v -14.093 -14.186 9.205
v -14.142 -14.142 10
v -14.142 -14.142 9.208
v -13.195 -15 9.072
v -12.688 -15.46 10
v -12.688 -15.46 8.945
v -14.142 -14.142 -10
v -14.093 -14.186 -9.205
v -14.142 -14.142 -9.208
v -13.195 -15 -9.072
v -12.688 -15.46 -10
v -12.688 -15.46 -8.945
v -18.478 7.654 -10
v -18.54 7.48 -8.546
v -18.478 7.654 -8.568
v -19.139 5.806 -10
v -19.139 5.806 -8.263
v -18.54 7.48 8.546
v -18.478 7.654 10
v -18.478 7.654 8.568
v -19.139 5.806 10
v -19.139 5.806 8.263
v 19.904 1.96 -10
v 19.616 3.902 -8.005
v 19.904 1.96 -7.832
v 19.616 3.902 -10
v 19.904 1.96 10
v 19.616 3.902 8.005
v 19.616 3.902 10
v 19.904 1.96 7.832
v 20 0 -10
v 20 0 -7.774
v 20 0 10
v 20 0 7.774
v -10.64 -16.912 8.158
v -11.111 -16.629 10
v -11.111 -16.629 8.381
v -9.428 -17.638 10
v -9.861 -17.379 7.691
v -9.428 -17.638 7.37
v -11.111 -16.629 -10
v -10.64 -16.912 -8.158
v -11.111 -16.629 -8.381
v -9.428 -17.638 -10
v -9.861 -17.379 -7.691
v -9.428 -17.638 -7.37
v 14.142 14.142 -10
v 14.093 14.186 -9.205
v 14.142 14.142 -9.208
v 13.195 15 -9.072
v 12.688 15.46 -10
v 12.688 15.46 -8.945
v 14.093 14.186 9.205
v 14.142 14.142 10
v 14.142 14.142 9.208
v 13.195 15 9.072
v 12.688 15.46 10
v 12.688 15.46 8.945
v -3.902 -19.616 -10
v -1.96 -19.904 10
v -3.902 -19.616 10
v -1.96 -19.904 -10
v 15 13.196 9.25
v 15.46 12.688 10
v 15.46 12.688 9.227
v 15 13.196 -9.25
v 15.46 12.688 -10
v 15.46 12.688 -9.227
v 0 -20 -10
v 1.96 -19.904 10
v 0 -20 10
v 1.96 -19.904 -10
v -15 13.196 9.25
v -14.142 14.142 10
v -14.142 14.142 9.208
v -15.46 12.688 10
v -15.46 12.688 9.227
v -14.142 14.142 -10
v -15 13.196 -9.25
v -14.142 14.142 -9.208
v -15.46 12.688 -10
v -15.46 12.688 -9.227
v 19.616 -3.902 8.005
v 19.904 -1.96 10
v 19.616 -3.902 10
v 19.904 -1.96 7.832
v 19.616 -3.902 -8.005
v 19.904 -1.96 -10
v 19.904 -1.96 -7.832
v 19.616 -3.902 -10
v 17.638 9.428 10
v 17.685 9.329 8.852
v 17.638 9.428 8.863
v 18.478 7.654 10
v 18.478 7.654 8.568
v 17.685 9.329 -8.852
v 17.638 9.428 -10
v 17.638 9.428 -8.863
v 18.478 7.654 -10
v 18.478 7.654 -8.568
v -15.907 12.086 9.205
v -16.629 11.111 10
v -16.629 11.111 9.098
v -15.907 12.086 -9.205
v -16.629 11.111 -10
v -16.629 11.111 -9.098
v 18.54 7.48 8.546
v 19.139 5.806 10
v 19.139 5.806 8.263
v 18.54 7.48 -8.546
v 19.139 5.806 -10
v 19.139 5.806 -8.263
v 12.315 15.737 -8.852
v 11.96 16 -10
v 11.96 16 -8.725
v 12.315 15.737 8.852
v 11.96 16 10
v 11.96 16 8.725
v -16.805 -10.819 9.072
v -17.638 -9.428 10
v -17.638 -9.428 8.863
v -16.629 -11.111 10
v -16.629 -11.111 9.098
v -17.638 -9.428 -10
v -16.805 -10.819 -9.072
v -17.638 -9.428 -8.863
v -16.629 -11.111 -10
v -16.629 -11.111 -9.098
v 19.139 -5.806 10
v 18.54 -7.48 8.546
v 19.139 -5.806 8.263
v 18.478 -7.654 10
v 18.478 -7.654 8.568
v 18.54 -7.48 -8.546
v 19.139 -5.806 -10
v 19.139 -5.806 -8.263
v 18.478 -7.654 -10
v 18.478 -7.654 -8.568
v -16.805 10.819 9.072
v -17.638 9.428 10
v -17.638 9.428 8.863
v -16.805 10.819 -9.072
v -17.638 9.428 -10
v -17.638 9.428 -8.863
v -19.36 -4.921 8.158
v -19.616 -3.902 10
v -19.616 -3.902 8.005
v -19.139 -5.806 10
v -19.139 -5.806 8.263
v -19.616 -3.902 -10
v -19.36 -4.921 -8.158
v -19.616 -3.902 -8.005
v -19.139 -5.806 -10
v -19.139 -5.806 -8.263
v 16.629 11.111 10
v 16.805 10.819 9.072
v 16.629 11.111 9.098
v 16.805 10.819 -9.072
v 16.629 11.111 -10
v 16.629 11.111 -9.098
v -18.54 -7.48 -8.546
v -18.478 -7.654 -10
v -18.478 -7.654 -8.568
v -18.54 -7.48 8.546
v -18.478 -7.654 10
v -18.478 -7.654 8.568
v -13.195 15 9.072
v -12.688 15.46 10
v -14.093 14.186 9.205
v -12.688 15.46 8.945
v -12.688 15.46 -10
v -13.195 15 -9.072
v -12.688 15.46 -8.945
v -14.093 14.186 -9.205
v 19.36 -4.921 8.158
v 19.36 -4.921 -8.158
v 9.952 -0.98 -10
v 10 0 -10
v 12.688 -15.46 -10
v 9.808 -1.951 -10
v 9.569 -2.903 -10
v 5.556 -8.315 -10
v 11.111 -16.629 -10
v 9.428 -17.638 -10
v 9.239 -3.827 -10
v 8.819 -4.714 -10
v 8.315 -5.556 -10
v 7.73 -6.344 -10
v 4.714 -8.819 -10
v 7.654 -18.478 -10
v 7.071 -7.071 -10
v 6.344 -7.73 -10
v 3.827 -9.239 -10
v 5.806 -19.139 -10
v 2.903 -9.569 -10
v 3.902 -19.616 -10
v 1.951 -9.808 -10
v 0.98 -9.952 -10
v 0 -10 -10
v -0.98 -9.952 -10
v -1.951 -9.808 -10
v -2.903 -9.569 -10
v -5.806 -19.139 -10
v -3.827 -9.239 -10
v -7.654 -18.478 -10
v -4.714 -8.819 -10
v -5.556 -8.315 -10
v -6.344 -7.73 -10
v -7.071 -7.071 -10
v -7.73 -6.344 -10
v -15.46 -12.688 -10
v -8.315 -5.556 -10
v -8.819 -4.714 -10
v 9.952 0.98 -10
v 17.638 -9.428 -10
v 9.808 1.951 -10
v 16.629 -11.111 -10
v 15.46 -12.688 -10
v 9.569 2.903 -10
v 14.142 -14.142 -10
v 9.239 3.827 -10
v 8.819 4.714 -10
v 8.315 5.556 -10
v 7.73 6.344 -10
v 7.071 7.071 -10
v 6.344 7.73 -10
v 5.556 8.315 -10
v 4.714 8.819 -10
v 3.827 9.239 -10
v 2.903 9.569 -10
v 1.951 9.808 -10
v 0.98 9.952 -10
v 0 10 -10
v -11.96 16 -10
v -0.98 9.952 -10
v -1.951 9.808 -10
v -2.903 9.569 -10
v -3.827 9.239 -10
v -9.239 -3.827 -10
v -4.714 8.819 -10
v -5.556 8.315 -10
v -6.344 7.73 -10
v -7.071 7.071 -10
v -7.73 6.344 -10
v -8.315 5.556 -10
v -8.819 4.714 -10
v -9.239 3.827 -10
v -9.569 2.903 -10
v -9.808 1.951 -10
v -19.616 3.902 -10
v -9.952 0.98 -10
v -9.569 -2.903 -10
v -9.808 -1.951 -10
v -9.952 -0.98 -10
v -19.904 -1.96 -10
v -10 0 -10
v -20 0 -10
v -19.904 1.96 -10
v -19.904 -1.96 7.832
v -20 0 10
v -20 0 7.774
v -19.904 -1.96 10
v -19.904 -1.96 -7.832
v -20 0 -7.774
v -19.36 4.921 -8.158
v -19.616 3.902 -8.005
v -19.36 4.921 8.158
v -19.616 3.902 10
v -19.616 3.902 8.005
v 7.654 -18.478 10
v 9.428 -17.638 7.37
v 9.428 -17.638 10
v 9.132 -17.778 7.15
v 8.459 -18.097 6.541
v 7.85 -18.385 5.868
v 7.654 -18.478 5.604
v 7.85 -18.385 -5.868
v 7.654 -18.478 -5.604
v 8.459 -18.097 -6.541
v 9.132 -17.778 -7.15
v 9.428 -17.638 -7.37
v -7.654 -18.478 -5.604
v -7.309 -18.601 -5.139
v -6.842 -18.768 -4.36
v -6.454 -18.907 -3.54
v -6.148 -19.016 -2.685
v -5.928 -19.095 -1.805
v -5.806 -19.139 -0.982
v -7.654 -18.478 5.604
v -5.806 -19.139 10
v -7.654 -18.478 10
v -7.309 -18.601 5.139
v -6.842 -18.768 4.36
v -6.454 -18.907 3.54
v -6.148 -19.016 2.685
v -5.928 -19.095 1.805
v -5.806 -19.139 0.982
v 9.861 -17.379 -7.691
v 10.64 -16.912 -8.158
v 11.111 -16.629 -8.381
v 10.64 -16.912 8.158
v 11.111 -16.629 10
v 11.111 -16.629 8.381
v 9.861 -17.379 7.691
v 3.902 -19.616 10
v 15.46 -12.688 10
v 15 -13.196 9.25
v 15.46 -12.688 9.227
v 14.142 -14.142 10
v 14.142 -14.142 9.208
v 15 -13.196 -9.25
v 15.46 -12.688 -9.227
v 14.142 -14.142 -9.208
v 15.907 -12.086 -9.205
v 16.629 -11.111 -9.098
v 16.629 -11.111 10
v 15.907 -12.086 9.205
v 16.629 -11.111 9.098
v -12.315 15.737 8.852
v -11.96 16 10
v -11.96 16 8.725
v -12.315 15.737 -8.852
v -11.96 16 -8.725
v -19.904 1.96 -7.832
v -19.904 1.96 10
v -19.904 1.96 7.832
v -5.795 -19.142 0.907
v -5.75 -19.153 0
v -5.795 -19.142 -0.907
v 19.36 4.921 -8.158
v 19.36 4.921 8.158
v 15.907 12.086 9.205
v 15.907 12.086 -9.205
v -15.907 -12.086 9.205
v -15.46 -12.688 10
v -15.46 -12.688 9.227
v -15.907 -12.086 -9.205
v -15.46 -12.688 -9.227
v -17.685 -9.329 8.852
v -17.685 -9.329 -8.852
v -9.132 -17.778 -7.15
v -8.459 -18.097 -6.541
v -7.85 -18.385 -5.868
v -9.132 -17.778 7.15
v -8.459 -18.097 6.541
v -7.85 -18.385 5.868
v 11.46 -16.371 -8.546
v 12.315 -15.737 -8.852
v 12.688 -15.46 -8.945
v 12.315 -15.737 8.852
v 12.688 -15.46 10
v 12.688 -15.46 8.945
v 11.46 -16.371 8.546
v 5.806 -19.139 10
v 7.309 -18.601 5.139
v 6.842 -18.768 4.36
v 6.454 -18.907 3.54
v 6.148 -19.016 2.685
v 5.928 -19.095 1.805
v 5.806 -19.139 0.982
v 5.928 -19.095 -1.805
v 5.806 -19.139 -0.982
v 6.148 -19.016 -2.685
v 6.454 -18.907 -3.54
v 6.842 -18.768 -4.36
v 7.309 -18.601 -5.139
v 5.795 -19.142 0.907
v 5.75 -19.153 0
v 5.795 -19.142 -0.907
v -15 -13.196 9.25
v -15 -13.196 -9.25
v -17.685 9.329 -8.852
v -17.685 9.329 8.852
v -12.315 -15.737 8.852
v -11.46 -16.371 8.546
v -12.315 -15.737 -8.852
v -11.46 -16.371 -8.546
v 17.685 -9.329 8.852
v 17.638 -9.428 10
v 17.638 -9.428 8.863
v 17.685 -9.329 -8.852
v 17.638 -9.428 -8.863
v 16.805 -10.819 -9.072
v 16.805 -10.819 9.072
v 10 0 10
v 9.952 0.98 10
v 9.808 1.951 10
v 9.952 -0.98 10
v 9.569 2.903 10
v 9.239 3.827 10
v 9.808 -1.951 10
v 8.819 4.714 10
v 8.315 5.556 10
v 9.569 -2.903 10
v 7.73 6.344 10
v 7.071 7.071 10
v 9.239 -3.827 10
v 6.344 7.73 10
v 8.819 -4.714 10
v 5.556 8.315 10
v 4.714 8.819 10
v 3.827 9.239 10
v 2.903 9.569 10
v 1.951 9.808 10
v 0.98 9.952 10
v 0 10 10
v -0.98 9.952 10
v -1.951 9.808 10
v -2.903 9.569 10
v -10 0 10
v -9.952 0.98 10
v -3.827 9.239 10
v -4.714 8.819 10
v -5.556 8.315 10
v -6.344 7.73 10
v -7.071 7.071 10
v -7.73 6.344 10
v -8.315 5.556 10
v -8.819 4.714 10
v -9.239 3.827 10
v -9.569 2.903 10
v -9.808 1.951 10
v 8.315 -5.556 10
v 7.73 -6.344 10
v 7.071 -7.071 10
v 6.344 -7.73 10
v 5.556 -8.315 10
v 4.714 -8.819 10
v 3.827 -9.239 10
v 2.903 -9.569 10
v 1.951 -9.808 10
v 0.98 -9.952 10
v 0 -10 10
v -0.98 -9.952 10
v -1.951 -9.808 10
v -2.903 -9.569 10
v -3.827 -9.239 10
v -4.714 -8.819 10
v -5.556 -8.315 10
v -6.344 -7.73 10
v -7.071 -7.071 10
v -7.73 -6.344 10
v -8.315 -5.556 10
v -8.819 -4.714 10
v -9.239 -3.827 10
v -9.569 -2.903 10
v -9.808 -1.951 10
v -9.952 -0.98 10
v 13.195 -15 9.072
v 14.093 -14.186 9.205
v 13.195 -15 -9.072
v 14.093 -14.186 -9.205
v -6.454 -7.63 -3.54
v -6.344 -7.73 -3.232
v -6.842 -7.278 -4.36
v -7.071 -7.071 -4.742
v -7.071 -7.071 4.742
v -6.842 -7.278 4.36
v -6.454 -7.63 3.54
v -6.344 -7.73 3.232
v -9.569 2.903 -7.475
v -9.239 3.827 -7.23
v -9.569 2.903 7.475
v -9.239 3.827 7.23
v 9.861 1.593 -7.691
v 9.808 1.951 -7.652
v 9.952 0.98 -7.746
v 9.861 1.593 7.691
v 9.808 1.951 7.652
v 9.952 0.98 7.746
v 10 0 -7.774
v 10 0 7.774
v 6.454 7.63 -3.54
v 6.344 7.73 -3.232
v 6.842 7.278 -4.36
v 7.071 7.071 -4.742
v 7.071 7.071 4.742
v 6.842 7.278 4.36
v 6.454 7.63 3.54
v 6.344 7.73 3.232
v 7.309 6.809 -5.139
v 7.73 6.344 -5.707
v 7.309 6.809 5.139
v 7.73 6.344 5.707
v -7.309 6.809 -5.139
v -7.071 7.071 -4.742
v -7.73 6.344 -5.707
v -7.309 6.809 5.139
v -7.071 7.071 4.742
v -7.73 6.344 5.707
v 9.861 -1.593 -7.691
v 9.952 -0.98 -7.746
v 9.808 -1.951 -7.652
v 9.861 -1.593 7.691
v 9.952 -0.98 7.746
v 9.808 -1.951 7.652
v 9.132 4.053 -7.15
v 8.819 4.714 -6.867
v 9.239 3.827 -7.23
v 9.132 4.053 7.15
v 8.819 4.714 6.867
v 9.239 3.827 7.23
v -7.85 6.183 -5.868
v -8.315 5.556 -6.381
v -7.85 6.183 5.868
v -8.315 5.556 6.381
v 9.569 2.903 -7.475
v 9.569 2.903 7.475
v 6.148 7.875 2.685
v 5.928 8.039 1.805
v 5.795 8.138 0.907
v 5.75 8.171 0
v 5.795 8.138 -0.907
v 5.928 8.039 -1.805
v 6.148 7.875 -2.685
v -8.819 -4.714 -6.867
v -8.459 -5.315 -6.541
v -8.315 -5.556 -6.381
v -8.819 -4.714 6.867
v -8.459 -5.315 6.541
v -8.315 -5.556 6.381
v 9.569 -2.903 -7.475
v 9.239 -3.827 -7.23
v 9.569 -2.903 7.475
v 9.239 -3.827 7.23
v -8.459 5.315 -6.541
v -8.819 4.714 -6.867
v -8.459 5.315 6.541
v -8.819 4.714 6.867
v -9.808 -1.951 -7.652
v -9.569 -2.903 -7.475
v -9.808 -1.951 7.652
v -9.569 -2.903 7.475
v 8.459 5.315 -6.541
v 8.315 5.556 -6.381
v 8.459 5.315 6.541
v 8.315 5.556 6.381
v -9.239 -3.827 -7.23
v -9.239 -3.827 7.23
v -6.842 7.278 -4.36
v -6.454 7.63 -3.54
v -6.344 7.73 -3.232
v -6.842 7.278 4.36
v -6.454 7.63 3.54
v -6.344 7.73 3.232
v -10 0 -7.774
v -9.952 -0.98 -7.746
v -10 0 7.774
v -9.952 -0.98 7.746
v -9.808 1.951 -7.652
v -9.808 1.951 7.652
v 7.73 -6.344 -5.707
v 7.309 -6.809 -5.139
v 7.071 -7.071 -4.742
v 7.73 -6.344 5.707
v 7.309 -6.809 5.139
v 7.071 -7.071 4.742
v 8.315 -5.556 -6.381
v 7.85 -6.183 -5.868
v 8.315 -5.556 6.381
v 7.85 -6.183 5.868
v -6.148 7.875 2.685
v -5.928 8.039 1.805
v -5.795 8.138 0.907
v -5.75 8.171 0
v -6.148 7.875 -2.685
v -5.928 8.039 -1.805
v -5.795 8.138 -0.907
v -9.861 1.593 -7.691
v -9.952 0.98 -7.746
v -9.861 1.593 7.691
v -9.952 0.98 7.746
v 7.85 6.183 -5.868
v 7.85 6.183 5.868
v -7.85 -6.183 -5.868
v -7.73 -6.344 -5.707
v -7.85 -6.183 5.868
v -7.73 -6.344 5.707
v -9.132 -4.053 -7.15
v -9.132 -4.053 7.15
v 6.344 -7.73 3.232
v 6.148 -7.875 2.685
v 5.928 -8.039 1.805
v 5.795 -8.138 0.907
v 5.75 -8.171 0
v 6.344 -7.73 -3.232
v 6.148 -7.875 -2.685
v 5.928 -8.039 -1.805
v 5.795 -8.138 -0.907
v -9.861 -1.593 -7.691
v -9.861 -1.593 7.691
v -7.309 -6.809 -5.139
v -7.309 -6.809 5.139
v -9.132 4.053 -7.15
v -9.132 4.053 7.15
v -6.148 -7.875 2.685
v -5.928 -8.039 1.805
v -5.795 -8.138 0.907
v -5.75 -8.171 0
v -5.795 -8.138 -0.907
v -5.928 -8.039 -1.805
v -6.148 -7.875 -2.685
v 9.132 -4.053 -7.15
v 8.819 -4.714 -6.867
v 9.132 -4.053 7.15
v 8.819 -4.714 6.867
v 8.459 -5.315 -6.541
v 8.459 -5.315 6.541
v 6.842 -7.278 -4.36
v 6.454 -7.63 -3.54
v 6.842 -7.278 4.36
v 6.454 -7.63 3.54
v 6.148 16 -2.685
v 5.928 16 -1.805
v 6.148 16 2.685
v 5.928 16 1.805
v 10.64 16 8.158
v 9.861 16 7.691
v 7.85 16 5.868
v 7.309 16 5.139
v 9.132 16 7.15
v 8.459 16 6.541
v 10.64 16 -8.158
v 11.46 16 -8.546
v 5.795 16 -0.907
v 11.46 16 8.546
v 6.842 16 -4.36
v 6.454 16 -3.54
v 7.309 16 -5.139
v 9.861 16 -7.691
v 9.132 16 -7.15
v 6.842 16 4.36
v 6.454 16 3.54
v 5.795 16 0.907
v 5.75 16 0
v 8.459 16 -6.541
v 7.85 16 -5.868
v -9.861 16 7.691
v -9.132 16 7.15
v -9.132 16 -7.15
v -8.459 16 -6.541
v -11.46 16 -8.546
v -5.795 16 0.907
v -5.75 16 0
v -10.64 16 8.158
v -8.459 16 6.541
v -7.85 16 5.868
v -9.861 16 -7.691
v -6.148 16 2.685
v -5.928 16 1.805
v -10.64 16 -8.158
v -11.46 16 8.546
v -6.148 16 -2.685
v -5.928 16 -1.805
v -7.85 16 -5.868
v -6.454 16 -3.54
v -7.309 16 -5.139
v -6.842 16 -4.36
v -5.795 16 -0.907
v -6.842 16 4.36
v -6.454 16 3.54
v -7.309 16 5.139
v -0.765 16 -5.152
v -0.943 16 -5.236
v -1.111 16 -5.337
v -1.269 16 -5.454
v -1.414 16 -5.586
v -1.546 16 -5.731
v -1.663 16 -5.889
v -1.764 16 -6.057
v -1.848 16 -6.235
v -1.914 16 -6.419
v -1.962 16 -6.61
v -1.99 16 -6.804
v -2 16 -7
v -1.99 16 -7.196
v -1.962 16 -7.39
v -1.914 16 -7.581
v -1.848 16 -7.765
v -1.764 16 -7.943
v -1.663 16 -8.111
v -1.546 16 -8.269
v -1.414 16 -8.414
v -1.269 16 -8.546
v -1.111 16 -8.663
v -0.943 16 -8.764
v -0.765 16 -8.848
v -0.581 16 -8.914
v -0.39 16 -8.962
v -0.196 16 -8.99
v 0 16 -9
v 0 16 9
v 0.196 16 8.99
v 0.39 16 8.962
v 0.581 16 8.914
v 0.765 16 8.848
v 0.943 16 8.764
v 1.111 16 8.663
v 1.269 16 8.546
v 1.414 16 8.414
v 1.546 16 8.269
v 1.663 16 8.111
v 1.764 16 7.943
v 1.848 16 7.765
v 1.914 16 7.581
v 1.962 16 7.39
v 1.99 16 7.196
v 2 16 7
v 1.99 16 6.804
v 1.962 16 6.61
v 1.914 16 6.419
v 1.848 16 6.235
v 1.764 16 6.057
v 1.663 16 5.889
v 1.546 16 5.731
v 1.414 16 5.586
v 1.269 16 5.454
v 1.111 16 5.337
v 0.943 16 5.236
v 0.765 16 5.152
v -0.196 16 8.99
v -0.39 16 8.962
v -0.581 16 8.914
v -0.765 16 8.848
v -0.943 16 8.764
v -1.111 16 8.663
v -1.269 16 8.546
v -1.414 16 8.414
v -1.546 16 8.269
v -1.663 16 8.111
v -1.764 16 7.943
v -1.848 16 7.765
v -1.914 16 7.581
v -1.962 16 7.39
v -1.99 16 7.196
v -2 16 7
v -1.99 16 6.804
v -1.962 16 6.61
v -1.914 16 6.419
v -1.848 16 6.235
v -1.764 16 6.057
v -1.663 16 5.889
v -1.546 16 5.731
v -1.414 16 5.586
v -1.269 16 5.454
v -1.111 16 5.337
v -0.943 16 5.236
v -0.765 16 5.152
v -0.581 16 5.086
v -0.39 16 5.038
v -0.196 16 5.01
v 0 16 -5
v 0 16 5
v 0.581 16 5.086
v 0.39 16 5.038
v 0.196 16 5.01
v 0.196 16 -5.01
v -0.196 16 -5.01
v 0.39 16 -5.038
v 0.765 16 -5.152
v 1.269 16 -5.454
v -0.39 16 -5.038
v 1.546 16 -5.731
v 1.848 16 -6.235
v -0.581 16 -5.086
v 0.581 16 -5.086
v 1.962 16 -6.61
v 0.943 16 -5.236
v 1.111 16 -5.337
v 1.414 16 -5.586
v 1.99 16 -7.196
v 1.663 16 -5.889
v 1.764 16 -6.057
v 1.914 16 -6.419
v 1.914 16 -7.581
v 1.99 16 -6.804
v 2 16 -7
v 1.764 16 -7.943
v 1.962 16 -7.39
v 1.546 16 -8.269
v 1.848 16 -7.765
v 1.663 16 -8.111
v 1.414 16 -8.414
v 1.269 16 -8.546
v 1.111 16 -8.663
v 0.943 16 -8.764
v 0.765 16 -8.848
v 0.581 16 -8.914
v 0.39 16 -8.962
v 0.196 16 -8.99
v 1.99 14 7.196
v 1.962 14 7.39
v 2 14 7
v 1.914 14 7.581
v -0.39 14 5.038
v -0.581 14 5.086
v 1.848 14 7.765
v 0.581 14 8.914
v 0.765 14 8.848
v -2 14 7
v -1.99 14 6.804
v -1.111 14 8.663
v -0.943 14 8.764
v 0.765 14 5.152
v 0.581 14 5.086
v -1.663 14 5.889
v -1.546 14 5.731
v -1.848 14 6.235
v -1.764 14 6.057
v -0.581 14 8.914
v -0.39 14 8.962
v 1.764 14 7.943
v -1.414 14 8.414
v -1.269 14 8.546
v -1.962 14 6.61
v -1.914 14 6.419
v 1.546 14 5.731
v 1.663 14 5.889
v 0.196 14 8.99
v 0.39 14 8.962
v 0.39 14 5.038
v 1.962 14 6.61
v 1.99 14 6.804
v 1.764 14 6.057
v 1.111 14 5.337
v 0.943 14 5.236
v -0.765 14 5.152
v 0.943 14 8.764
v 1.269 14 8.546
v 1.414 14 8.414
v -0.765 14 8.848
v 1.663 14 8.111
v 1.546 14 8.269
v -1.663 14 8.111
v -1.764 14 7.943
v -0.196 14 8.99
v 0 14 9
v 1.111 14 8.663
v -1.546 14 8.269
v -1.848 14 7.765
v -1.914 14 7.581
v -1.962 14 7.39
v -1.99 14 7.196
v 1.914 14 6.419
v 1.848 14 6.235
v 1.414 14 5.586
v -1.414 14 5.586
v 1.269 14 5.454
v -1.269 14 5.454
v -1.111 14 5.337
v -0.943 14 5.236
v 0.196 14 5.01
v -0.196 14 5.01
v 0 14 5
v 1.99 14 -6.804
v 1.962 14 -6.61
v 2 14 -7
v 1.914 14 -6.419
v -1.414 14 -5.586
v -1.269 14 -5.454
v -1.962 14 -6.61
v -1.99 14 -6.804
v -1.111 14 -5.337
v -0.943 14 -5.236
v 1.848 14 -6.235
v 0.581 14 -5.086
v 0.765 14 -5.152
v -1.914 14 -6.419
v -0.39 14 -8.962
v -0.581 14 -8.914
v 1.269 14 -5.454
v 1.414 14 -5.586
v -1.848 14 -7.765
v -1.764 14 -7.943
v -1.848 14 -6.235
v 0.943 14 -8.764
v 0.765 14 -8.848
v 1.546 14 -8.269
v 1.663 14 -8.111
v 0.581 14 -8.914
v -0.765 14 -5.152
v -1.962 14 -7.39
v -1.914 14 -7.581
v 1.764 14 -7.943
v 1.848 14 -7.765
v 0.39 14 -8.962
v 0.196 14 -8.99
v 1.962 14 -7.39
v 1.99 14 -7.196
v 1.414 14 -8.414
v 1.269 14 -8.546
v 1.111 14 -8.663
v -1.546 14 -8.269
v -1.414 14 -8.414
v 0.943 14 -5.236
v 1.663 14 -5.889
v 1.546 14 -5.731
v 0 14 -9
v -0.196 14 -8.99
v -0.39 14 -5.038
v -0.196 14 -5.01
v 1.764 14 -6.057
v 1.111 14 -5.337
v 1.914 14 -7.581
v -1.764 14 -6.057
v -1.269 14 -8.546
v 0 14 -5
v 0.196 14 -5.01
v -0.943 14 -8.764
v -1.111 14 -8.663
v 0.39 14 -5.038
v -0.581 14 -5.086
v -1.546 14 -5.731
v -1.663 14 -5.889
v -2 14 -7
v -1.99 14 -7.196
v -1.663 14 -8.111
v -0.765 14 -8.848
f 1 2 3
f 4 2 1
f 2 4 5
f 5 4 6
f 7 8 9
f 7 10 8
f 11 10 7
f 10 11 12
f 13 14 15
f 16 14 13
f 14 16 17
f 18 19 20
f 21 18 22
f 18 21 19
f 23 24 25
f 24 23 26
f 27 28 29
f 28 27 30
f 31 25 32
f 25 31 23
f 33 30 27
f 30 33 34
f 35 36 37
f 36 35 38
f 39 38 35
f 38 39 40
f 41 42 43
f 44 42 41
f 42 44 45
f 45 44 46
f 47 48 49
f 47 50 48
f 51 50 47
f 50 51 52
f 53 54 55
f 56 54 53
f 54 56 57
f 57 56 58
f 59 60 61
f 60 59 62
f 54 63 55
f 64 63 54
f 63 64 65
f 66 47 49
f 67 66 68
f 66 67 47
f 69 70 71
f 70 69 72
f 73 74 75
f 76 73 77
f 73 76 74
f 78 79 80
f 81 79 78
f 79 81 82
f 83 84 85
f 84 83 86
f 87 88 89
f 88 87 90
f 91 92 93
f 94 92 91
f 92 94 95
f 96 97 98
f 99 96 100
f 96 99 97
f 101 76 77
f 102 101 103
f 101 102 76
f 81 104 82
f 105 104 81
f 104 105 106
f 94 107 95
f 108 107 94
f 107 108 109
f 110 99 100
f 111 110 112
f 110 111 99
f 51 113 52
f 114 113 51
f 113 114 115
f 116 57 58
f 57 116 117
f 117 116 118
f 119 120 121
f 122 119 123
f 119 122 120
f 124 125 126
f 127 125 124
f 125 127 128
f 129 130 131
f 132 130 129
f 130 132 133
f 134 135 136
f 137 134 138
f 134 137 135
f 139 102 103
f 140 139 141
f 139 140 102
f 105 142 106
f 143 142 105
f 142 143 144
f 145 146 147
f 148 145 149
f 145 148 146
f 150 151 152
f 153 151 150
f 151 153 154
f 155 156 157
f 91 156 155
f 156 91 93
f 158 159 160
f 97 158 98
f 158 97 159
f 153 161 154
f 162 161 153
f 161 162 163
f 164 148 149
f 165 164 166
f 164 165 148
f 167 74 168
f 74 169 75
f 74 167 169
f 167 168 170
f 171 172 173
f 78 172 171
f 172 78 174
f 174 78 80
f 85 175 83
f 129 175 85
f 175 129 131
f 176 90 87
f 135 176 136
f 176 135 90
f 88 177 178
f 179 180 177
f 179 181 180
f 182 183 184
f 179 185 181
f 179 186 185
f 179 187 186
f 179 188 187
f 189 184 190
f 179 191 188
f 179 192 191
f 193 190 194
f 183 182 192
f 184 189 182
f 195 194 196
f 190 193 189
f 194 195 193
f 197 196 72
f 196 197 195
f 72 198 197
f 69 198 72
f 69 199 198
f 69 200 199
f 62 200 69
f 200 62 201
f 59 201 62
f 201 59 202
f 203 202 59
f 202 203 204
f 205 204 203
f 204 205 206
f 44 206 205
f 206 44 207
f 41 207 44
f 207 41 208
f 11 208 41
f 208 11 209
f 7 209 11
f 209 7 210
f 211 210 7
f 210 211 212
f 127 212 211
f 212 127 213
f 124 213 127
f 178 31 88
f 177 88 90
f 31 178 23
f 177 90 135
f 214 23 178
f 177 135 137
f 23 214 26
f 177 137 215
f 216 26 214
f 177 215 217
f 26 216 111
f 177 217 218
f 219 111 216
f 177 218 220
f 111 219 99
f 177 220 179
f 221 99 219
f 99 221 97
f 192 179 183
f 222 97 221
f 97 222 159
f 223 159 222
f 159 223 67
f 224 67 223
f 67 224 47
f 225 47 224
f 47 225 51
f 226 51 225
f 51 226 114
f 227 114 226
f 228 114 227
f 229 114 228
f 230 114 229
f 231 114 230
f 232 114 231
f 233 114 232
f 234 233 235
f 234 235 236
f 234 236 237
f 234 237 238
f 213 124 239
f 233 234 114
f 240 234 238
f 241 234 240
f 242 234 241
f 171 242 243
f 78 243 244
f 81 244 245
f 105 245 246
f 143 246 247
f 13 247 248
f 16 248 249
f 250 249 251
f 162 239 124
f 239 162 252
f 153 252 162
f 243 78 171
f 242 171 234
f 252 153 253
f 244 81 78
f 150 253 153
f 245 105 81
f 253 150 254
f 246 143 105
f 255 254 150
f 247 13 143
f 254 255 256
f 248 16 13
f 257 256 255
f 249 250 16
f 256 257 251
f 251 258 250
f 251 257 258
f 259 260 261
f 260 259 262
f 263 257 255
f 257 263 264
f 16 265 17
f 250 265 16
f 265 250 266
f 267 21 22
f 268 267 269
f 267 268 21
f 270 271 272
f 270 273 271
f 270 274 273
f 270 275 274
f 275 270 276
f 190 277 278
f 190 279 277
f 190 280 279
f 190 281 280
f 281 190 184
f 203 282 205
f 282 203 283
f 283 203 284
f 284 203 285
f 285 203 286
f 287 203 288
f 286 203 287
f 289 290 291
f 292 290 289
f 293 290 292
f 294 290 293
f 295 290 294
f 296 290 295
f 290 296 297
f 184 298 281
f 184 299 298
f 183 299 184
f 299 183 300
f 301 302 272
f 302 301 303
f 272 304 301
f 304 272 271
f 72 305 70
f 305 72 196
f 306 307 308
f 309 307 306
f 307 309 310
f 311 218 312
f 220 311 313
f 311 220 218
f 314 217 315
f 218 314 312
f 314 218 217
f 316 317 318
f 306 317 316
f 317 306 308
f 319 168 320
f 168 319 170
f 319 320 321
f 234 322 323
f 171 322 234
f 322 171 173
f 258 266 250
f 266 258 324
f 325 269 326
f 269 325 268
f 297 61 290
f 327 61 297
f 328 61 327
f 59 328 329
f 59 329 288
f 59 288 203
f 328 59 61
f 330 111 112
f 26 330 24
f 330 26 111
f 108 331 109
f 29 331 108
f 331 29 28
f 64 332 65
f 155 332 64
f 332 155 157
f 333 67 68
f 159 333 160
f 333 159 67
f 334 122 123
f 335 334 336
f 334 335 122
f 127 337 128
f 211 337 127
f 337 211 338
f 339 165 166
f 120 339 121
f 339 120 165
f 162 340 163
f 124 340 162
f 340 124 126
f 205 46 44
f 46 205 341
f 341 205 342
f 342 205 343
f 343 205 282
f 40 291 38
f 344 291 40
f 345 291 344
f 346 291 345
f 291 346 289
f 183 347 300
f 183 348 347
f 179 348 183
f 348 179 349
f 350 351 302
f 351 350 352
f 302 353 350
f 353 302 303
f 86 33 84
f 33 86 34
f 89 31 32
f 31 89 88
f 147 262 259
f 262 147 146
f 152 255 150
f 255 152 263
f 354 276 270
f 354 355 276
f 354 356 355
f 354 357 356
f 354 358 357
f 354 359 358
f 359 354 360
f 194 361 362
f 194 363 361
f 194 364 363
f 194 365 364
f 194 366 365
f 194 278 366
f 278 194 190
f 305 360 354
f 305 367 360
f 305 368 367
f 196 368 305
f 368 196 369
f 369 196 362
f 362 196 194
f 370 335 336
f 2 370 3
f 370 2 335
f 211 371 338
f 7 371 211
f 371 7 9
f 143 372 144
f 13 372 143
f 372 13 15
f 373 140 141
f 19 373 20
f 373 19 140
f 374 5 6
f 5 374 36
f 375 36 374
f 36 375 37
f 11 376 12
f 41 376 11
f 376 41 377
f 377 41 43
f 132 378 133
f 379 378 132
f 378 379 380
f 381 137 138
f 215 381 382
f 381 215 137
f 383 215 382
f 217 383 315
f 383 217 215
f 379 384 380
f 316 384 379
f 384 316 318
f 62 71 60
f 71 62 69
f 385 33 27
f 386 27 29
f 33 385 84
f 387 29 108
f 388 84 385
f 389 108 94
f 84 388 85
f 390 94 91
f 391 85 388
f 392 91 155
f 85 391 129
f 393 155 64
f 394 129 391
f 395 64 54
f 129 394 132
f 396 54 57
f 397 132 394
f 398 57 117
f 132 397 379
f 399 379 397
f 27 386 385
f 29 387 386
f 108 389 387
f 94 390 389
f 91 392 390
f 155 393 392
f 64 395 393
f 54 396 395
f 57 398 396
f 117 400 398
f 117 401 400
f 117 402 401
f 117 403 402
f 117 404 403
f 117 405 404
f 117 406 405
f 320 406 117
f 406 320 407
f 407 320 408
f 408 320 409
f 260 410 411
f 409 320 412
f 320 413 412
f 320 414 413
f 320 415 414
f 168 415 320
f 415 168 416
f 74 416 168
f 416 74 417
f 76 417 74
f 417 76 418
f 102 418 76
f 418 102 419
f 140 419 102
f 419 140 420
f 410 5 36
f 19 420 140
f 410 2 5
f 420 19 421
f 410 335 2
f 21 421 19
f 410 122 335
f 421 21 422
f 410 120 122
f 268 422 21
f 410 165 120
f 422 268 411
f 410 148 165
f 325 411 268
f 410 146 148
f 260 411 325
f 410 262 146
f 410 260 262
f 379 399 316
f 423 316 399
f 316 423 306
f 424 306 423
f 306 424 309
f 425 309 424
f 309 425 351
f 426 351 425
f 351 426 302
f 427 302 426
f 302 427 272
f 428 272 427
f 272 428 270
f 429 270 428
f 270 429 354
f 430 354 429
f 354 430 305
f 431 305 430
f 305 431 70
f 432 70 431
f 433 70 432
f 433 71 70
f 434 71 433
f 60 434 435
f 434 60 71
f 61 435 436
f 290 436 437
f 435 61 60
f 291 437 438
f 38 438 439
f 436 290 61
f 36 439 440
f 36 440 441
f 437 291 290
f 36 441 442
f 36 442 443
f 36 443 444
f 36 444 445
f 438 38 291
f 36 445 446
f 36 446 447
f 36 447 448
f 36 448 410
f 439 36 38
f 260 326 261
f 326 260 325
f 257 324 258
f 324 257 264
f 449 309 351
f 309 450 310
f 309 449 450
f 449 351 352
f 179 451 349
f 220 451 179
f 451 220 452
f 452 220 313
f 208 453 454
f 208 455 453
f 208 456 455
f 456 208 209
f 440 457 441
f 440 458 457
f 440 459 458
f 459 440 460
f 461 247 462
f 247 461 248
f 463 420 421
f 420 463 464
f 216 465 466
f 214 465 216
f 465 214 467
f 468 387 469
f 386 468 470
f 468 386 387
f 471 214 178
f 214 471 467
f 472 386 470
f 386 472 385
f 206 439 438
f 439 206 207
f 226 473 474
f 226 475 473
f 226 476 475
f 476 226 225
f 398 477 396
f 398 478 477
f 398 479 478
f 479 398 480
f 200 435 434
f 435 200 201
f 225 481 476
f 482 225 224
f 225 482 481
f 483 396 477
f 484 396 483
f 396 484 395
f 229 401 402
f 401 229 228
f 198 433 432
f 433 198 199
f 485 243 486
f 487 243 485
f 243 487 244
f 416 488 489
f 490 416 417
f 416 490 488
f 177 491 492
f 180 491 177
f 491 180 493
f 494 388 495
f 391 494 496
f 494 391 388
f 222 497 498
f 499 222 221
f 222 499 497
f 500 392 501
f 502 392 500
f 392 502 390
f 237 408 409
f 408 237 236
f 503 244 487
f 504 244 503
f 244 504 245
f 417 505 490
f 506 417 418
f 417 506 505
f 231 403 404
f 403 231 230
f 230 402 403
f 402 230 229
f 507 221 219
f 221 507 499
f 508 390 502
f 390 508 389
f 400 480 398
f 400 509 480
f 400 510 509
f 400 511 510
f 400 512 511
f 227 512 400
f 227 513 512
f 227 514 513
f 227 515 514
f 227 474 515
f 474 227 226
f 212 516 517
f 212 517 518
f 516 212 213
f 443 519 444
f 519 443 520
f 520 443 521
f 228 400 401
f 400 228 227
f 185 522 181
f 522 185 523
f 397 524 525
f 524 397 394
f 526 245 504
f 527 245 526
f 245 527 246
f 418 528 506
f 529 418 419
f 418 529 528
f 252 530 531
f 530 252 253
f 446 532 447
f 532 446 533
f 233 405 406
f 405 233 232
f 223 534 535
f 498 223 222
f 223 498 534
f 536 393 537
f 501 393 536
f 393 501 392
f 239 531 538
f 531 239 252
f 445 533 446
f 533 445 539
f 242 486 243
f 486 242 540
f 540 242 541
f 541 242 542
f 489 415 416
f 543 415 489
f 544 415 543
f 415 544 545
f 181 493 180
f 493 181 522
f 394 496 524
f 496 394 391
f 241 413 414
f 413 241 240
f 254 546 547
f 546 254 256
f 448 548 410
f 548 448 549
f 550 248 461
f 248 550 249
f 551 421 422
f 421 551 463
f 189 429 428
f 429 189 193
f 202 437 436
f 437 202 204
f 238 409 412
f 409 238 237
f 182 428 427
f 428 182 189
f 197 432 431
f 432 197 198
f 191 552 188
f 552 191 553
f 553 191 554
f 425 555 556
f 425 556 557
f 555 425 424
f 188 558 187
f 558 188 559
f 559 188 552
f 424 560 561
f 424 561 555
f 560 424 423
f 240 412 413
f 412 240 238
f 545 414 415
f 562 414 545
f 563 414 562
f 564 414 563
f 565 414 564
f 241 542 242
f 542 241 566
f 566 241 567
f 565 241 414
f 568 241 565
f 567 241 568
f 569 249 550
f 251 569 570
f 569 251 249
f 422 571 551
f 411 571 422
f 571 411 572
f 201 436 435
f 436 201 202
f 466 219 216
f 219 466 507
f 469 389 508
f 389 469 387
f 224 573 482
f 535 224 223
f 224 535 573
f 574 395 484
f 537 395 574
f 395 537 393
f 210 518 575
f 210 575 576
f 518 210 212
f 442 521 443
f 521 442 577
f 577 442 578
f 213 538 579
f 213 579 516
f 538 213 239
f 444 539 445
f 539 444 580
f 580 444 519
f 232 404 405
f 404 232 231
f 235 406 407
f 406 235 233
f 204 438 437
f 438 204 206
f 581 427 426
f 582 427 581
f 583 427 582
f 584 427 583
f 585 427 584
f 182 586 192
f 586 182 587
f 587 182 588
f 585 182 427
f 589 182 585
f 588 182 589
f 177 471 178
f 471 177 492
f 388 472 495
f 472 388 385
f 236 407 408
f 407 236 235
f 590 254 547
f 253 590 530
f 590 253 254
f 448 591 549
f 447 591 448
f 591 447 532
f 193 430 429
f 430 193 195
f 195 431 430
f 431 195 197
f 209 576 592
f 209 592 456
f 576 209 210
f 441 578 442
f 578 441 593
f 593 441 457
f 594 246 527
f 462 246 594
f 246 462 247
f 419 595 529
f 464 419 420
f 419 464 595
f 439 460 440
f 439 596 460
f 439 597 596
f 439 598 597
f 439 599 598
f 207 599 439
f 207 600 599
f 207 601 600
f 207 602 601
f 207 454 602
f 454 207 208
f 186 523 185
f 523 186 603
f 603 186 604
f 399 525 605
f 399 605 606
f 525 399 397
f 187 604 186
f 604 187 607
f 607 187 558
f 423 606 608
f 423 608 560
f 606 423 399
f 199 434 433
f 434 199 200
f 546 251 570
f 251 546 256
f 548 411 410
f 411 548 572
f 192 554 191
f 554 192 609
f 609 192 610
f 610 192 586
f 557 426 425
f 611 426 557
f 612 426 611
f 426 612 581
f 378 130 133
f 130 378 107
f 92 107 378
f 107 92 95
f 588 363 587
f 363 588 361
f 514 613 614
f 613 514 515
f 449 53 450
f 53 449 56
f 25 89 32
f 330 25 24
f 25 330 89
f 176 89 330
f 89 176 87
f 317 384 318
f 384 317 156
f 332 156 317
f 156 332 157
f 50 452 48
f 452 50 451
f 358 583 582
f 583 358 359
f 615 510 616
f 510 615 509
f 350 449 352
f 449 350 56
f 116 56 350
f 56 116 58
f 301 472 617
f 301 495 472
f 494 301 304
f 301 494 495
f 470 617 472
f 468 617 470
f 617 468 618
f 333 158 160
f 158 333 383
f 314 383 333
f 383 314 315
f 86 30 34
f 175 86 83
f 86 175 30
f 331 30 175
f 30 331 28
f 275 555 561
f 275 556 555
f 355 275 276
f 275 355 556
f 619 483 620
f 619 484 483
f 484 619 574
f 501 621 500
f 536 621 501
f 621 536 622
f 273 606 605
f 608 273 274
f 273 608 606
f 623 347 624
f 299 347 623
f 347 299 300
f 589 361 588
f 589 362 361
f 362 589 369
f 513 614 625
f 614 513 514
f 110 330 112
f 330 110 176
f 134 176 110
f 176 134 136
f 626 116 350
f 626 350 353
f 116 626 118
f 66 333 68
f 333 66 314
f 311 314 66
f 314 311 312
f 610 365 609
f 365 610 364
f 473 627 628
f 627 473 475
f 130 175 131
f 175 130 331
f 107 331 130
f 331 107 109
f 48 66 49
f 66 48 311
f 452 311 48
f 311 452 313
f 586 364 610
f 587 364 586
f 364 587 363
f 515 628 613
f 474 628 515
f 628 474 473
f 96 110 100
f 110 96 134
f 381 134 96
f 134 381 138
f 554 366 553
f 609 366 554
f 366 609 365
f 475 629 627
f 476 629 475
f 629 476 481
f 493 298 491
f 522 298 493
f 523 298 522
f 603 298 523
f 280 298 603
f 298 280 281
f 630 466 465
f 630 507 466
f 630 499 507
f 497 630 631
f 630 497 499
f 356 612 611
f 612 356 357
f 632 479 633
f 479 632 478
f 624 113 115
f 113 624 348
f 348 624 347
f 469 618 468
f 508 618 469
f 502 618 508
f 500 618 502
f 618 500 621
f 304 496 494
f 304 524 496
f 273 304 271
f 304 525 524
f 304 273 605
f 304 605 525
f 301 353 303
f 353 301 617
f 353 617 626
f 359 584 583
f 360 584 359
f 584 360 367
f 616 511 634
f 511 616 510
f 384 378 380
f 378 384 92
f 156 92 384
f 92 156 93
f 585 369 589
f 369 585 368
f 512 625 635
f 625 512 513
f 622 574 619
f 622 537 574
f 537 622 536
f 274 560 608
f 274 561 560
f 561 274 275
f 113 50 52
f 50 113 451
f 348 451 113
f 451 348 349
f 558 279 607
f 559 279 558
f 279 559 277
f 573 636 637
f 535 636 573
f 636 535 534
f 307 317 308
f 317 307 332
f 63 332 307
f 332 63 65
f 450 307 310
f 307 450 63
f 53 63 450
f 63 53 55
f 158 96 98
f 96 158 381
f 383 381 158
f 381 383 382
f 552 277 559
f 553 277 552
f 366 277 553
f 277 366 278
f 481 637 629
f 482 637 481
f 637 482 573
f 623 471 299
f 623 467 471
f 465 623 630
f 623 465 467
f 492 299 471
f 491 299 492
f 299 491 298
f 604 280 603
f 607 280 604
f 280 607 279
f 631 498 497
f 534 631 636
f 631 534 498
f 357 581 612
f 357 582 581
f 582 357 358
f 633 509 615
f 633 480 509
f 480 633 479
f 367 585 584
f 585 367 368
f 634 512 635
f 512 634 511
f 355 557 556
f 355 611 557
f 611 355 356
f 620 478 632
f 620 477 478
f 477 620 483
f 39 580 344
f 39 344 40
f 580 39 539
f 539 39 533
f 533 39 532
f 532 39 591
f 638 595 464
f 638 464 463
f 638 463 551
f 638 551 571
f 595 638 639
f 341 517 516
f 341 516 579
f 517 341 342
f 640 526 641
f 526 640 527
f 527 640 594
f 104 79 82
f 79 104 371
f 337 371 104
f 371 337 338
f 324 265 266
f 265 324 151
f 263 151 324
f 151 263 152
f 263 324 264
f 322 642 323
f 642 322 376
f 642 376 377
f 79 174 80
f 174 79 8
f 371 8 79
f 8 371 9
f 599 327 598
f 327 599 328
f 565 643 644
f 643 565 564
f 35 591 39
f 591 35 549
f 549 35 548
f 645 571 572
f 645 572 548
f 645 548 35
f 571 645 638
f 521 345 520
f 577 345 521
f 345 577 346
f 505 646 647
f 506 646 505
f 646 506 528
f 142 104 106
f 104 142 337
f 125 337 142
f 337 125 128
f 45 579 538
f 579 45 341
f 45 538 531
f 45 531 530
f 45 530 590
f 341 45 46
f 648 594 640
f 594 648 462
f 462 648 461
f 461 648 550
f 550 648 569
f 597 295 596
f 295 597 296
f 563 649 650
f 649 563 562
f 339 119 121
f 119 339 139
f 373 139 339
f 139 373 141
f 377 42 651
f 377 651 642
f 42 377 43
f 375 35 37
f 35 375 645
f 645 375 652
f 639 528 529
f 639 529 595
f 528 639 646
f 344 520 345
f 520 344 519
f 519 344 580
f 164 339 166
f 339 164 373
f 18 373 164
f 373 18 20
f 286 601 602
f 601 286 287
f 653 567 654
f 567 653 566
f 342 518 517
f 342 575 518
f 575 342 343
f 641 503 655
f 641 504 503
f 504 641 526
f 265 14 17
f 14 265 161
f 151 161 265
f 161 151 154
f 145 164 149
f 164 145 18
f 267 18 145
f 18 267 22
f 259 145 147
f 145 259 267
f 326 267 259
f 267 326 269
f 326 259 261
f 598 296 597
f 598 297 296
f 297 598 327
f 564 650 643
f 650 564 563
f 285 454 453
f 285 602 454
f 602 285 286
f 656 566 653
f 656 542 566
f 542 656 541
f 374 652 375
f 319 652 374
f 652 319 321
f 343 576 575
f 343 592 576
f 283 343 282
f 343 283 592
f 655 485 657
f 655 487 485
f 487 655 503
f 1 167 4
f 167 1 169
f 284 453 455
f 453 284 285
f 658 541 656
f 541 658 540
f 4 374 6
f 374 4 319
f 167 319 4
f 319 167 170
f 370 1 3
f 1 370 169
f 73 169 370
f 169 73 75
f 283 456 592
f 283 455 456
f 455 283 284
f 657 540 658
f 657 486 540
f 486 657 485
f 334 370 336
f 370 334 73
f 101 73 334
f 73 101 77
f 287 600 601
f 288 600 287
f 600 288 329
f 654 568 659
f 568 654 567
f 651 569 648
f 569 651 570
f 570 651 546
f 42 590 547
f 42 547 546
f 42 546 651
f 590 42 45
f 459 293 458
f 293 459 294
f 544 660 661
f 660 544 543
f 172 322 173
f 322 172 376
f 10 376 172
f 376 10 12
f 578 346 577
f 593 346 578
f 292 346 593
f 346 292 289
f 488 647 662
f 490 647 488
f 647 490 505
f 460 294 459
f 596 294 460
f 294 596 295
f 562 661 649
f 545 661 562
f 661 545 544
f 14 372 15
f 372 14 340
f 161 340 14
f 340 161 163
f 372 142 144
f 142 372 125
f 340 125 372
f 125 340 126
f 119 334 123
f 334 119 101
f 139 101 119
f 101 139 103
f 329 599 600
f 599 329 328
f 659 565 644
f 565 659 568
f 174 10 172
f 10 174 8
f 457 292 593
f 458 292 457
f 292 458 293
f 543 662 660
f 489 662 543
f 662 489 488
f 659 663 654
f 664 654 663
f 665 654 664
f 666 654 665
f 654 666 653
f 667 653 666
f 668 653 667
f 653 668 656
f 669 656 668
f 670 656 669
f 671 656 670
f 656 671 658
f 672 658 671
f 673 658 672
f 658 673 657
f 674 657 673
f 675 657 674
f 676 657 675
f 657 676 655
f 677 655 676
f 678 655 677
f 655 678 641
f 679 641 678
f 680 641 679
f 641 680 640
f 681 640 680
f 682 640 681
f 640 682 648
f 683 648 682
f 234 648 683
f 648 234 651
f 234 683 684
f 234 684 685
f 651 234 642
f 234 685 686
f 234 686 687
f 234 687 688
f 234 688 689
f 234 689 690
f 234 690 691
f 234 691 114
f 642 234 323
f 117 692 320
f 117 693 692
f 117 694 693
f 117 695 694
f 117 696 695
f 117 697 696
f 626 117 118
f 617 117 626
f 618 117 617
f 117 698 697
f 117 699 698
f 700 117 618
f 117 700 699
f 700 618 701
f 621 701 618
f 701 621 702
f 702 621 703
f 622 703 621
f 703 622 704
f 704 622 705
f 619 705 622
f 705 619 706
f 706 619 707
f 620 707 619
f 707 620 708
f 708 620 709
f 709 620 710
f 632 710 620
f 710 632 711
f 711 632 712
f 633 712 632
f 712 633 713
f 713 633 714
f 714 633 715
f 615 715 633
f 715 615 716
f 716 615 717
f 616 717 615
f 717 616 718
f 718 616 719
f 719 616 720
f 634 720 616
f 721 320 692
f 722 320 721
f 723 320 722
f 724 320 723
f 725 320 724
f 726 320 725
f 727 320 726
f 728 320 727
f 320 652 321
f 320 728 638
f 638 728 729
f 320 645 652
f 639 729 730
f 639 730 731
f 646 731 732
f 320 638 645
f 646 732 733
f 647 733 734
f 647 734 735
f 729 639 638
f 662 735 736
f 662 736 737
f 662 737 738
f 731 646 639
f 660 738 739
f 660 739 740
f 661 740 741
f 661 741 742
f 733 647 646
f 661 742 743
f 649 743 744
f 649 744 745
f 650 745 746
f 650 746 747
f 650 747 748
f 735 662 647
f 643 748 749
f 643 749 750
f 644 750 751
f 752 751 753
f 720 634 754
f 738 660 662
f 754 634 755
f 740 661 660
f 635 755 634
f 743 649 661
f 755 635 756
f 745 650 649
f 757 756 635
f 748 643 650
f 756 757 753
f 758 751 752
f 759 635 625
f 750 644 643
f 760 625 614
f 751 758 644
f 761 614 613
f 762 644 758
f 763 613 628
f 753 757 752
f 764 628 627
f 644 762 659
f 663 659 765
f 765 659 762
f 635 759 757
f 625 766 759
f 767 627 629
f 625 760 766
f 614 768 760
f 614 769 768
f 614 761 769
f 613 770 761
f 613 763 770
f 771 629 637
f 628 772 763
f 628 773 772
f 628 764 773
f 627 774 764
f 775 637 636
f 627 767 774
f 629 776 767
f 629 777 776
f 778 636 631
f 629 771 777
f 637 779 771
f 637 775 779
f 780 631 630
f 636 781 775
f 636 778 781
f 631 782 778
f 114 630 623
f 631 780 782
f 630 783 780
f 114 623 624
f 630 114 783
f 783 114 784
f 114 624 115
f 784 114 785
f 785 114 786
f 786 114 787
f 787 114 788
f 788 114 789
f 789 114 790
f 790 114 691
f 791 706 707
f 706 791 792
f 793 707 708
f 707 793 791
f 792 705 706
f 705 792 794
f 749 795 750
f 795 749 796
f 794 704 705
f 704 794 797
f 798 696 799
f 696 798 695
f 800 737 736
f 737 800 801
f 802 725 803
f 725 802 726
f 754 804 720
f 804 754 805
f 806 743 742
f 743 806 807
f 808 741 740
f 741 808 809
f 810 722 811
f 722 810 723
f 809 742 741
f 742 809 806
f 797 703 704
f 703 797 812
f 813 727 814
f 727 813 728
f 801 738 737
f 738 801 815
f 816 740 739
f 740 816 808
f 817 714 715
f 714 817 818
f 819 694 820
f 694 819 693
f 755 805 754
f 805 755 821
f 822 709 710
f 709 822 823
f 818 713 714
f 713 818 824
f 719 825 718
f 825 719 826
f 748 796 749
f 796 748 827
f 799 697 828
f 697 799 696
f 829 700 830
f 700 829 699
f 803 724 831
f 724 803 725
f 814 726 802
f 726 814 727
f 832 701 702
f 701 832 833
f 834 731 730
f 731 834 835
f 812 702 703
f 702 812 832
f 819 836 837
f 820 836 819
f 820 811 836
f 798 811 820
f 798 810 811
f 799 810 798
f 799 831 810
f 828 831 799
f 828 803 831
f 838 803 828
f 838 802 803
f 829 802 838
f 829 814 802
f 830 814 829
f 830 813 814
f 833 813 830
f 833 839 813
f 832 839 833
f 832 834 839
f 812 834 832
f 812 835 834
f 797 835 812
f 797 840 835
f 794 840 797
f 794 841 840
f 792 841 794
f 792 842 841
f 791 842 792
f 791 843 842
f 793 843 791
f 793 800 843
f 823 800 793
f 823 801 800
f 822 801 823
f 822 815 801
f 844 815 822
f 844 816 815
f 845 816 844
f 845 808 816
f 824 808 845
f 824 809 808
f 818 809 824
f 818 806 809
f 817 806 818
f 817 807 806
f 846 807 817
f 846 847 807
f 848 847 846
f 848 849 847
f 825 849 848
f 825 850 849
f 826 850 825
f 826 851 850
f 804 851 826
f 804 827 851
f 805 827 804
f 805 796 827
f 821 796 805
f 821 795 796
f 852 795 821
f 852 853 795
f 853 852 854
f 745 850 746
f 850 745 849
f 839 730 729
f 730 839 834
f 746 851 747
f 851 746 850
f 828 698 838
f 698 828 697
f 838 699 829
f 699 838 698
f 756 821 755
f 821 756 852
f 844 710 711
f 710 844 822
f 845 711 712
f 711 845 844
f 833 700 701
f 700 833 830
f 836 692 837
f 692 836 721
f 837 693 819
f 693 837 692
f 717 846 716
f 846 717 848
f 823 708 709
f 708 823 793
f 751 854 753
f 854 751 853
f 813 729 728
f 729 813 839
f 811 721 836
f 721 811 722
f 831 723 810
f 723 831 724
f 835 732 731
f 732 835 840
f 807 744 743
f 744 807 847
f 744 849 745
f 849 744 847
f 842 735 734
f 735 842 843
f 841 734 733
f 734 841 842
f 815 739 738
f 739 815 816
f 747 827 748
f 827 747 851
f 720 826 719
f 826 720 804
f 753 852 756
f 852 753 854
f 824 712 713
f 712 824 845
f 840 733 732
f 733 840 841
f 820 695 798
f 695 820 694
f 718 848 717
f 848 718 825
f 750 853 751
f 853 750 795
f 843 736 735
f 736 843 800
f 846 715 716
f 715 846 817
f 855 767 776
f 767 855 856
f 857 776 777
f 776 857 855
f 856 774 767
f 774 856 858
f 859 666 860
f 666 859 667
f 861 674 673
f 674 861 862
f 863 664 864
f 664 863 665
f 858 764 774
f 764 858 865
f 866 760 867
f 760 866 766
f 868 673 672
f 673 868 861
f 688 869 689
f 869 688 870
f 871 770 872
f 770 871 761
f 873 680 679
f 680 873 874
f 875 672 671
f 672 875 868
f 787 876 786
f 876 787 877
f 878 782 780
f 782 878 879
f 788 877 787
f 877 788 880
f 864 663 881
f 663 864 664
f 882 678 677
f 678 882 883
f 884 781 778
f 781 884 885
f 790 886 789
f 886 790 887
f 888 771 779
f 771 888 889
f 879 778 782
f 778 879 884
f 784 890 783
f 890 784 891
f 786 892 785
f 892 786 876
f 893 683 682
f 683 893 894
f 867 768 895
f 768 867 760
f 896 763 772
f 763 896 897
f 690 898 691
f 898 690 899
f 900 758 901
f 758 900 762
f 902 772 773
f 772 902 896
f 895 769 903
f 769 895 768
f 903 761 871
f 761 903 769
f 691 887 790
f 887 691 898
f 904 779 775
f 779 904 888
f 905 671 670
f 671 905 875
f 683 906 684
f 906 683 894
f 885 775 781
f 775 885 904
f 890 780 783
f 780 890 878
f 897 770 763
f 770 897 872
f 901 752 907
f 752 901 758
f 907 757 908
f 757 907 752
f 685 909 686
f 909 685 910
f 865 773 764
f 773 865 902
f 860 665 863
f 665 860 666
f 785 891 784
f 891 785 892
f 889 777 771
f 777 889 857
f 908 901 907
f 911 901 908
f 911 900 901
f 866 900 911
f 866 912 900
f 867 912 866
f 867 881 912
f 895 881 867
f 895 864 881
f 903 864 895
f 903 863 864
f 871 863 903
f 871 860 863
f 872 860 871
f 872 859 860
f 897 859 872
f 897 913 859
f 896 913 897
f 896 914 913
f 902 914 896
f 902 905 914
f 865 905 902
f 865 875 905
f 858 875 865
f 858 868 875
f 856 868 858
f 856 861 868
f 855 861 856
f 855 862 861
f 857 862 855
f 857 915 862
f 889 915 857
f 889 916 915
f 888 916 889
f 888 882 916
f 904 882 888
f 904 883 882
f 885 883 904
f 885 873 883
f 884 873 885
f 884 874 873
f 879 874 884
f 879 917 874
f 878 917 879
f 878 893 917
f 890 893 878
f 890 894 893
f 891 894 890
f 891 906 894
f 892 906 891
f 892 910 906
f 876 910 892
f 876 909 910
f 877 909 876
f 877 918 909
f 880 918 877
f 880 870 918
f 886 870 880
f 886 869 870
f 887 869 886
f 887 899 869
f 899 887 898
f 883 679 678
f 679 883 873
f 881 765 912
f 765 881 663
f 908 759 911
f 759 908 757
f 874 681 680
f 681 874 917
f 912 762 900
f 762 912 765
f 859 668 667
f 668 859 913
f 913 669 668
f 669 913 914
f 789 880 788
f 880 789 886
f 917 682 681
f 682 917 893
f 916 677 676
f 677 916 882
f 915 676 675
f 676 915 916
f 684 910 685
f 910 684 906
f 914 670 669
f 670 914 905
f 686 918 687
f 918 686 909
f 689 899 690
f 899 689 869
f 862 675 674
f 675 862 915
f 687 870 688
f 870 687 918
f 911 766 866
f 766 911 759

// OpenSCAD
// COBRA Vertebra - T11 V17
// Height: 20.0mm, OD: 40.0mm

$fn = 64;

difference() {
    // Outer cylinder
    cylinder(h=20.0, d=40.0, center=true);
    
    // Inner channel
    cylinder(h=22.0, d=20.0, center=true);

    // Battery cavity 1
    rotate([0, 0, 0])
    translate([15.0, 0, 0])
    rotate([90, 0, 0])
    cylinder(h=74.0, d=18.5, center=true);

    // Battery cavity 2
    rotate([0, 0, 180])
    translate([15.0, 0, 0])
    rotate([90, 0, 0])
    cylinder(h=74.0, d=18.5, center=true);

    // Solar panel cavity
    translate([0, 18.0, 0])
    cube([50, 4, 30], center=true);

    // Pivot holes
    translate([0, 20.0, 7.0])
    rotate([90, 0, 0])
    cylinder(h=12.0, d=4, center=true);
    
    translate([0, 20.0, -7.0])
    rotate([90, 0, 0])
    cylinder(h=12.0, d=4, center=true);
}
